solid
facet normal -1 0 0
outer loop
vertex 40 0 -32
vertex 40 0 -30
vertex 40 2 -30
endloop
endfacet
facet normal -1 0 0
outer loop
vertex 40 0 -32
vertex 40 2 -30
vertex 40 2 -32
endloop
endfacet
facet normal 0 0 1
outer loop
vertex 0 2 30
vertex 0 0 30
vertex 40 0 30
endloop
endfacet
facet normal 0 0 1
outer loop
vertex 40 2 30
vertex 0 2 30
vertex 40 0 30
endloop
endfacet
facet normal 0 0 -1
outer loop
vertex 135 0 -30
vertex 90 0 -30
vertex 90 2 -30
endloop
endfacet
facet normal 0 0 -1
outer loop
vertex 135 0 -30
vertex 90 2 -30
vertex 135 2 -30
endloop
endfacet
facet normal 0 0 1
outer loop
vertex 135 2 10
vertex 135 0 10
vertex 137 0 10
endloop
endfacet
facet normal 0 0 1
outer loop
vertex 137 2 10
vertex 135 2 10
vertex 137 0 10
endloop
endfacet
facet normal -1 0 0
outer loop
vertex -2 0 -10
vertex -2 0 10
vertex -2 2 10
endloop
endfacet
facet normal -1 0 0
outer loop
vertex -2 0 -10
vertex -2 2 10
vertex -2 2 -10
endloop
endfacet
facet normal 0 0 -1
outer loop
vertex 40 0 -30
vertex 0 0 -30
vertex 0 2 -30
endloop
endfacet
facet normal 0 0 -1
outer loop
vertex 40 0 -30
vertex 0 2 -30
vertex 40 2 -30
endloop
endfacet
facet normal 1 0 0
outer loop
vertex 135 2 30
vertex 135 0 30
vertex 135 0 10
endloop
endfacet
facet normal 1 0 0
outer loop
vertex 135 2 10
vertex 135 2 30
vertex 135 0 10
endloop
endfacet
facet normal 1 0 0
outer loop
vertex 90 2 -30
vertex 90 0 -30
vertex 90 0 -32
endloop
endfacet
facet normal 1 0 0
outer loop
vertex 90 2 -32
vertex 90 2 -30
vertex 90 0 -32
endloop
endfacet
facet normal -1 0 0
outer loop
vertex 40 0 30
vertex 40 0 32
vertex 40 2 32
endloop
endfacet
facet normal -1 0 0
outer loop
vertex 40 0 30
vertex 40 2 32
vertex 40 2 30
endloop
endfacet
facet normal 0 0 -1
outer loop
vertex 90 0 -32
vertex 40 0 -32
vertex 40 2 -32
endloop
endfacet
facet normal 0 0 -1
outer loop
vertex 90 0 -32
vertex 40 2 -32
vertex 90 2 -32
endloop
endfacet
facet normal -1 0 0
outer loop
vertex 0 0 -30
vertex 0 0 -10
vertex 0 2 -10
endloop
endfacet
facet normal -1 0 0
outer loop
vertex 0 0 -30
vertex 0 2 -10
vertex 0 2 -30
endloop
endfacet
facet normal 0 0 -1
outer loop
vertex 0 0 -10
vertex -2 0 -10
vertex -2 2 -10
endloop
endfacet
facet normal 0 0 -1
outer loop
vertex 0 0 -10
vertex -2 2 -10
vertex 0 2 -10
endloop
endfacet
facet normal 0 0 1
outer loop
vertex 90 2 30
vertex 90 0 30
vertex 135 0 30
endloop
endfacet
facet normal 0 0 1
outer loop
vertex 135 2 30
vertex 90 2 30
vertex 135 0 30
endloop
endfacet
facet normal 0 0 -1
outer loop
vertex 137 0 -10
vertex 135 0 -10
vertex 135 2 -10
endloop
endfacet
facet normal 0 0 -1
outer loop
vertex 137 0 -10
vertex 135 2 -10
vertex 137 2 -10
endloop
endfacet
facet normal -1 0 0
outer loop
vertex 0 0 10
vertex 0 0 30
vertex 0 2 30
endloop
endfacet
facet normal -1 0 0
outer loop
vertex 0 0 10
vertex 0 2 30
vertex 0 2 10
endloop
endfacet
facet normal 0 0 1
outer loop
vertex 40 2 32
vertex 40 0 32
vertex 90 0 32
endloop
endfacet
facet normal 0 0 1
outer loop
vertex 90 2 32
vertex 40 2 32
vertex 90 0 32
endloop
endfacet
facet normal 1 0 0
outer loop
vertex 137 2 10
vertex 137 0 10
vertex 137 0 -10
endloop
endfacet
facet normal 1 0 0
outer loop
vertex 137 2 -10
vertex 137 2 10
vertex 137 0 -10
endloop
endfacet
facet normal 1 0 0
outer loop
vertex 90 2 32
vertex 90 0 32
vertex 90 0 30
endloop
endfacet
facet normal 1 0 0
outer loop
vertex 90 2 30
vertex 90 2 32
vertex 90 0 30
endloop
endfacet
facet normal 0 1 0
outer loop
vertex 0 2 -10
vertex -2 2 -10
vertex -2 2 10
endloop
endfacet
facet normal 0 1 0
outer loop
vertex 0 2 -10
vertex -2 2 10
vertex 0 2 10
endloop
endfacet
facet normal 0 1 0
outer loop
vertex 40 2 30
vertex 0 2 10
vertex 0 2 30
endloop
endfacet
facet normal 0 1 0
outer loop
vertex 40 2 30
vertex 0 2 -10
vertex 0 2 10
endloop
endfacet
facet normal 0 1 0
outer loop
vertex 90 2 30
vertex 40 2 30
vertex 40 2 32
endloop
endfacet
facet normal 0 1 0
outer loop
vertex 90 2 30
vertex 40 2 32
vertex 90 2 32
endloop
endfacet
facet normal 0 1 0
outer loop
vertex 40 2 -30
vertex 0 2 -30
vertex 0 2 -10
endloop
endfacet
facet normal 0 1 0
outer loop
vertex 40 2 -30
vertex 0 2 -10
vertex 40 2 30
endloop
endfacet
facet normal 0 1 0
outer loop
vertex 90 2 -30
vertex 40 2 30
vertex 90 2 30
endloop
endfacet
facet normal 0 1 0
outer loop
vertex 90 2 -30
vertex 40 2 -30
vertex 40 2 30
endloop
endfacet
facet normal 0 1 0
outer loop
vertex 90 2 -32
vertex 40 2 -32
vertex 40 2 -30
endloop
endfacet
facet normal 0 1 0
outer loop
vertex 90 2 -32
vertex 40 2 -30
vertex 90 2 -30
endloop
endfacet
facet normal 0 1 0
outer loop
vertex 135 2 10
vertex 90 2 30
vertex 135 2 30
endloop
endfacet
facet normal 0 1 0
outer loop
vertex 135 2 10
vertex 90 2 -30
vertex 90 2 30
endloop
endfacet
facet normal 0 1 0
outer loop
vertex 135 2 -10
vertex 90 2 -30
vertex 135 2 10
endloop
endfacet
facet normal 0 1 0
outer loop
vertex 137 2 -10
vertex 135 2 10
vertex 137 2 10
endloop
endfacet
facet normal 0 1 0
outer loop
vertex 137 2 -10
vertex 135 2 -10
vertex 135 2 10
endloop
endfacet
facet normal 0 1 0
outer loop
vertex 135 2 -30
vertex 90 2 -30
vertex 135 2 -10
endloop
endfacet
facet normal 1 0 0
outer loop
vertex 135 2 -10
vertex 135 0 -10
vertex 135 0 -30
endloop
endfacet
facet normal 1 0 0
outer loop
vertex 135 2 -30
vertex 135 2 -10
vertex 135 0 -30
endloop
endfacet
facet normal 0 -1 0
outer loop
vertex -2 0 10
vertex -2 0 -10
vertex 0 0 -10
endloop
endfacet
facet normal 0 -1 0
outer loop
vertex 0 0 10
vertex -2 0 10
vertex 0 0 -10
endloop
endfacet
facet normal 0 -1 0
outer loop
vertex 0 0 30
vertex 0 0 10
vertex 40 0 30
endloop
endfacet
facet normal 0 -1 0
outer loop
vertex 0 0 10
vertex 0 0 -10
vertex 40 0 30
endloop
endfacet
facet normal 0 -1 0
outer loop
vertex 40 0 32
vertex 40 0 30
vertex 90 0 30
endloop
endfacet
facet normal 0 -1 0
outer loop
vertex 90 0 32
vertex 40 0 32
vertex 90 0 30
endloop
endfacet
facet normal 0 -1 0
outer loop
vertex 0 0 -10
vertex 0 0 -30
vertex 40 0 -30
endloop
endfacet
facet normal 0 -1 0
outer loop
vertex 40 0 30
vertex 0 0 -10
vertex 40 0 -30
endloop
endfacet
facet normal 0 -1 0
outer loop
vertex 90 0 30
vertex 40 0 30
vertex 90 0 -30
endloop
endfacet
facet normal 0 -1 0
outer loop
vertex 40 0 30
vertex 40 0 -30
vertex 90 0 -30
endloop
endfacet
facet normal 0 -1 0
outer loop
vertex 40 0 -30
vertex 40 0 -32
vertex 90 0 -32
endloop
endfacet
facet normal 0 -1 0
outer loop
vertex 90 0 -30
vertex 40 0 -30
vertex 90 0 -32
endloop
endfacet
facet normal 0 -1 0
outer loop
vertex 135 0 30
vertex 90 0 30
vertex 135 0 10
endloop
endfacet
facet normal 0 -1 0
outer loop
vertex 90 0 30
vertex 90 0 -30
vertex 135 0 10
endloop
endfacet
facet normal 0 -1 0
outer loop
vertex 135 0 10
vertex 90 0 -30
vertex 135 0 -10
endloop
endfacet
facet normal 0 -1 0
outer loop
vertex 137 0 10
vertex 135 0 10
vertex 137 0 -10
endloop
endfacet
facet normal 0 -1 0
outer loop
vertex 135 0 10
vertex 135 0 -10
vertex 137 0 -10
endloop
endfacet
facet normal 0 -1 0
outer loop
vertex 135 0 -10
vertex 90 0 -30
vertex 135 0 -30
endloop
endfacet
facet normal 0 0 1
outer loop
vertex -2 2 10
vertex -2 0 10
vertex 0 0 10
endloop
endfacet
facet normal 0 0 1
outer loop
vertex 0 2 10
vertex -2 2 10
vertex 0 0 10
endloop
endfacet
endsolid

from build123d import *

# Parameters (mm, degrees)
SKETCH_2_W      = 2
SKETCH_2_H      = 20
SKETCH_2_W_2    = 50
SKETCH_2_H_2    = 2
SKETCH_2_W_3    = 135
SKETCH_2_H_3    = 60
EXTRUDE_1_DEPTH = 2


with BuildPart() as part:
    # 草图2 → 凸台-拉伸1 (new body)
    with BuildSketch(Plane(origin=(0, 0, 0), x_dir=(1, 0, 0), z_dir=(0, 1, 0))):
        with Locations((-1, 0)):
            Rectangle(SKETCH_2_W, SKETCH_2_H)
        with Locations((65, 31)):
            Rectangle(SKETCH_2_W_2, SKETCH_2_H_2)
        with Locations((136, 0)):
            Rectangle(SKETCH_2_W, SKETCH_2_H)
        with Locations((65, -31)):
            Rectangle(SKETCH_2_W_2, SKETCH_2_H_2)
        with Locations((67.5, 0)):
            Rectangle(SKETCH_2_W_3, SKETCH_2_H_3)
    extrude(amount=EXTRUDE_1_DEPTH)


solid = part.part
